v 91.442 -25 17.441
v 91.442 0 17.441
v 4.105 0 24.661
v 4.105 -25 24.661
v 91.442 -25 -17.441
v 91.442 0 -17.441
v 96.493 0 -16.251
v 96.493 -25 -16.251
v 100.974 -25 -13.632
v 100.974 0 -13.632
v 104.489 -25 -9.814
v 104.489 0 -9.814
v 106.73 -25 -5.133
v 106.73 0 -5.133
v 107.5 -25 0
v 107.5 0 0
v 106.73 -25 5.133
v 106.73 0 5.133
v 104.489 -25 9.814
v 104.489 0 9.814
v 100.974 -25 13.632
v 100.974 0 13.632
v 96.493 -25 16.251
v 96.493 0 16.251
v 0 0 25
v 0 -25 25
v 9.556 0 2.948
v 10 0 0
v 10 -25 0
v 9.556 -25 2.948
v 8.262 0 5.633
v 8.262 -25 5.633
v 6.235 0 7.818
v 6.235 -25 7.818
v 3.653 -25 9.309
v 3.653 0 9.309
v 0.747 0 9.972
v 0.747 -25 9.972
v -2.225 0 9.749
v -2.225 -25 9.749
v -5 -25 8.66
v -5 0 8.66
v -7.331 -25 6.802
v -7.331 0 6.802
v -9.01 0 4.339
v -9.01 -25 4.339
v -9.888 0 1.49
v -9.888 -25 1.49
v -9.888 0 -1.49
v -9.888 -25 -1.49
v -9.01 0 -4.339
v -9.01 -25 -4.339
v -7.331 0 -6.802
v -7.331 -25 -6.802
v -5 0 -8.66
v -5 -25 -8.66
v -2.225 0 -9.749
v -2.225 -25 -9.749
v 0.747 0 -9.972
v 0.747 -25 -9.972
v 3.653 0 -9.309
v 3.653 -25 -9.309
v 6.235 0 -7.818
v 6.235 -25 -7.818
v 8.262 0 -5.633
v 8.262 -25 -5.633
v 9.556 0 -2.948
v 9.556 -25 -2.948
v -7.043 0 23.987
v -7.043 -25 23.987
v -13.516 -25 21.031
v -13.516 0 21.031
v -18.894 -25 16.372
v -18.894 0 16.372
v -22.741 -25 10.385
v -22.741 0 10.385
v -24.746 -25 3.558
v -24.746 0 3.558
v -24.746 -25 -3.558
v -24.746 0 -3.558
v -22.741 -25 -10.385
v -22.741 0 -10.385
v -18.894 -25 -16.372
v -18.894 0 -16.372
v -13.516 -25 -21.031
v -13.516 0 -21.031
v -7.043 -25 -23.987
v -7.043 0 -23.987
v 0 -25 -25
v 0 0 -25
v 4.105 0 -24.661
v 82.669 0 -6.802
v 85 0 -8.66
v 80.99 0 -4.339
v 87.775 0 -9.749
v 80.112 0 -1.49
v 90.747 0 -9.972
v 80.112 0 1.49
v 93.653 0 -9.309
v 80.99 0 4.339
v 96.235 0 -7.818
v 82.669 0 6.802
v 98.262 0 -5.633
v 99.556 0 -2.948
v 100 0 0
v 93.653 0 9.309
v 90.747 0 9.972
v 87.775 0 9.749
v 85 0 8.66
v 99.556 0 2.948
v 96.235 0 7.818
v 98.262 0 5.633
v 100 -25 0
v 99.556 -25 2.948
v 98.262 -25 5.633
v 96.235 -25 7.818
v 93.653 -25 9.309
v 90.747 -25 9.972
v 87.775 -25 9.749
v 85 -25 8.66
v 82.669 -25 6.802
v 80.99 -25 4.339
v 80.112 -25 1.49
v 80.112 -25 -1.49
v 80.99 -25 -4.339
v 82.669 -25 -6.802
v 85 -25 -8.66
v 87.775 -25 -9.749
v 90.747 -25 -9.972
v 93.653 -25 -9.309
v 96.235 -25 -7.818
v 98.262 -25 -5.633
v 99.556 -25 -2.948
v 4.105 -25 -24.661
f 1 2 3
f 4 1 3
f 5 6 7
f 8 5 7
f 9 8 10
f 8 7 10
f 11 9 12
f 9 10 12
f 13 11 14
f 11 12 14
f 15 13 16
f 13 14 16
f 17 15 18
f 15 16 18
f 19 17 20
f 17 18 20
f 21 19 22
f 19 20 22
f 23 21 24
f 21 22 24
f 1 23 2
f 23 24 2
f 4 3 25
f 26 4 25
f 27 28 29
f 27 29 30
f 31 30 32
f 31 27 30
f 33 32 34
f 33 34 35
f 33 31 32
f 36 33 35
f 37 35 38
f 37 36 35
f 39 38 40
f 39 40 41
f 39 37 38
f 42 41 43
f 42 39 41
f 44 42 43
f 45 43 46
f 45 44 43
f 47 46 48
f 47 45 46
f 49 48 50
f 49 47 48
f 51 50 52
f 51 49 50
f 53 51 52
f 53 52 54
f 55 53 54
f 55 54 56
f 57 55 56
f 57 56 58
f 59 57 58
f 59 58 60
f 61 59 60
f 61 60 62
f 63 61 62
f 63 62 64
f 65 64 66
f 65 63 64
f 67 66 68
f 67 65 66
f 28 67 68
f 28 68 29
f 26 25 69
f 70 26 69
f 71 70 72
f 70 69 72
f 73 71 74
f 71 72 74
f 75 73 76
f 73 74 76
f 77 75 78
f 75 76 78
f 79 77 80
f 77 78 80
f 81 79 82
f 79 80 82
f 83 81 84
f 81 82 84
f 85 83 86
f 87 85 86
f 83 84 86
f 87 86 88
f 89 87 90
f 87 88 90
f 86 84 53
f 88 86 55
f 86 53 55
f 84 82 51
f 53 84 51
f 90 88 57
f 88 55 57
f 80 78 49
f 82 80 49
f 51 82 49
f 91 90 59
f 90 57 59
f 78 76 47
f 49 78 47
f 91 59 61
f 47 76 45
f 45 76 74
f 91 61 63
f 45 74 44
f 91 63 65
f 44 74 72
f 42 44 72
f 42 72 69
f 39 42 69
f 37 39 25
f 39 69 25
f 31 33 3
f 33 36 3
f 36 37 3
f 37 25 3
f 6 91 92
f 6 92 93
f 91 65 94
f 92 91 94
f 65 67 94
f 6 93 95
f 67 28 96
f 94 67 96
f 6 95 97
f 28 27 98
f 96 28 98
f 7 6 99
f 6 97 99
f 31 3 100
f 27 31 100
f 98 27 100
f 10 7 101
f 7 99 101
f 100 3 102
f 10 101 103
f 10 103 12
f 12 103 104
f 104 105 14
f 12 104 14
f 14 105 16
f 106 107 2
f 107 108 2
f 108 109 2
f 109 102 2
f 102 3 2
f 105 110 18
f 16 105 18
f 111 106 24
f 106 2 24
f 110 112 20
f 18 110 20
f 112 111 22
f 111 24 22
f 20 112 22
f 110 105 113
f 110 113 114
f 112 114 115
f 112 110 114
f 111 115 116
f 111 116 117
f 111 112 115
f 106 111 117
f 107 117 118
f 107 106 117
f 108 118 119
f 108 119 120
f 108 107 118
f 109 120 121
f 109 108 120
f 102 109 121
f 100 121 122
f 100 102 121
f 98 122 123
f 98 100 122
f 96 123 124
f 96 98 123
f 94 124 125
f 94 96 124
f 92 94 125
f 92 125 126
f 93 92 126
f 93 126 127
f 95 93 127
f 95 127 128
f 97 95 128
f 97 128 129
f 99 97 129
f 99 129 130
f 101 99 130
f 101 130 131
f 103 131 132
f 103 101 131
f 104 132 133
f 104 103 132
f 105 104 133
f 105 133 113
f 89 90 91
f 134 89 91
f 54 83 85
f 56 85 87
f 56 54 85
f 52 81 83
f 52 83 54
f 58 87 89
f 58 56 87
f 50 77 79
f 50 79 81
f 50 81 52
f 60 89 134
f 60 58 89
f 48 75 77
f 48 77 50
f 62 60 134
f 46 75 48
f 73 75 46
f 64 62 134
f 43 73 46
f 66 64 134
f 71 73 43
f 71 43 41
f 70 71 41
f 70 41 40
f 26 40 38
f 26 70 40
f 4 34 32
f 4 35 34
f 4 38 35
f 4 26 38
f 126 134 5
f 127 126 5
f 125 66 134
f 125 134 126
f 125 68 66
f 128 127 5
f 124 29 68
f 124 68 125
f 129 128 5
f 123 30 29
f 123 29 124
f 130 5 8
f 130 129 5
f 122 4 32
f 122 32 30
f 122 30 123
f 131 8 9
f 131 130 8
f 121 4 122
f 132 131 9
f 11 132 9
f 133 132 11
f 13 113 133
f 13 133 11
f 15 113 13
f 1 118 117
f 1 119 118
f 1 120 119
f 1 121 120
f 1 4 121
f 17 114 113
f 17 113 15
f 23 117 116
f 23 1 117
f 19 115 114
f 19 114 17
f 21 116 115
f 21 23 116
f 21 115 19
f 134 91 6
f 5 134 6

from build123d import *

# Parameters (mm, degrees)
F0_R     = 10
F1_DEPTH = 25


with BuildPart() as f1:
    # F0 (on Front) → F1 (new body)
    with BuildSketch(Plane.XZ):
        with BuildLine():
            Line((4.1054428346, 24.6606029758), (0, 25))
            ThreePointArc((0, 25), (-25, 0), (0, -25))
            Line((0, -25), (4.1054428346, -24.6606029758))
            ThreePointArc((4.1054428346, -24.6606029758), (19.0740146648, -16.1611251022), (25, 0))
            ThreePointArc((25, 0), (19.0740146648, 16.1611251022), (4.1054428346, 24.6606029758))
        make_face()
        Circle(F0_R, mode=Mode.SUBTRACT)
        with BuildLine():
            Line((91.4418067738, 17.4405043857), (4.1054428346, 24.6606029758))
            ThreePointArc((4.1054428346, 24.6606029758), (19.0740146648, 16.1611251022), (25, 0))
            ThreePointArc((25, 0), (19.0740146648, -16.1611251022), (4.1054428346, -24.6606029758))
            Line((4.1054428346, -24.6606029758), (91.4418067738, -17.4405043857))
            ThreePointArc((91.4418067738, -17.4405043857), (72.5, 0), (91.4418067738, 17.4405043857))
        make_face()
        with BuildLine():
            ThreePointArc((107.5, 0), (102.8740362463, 11.8536572723), (91.4418067738, 17.4405043857))
            ThreePointArc((91.4418067738, 17.4405043857), (72.5, 0), (91.4418067738, -17.4405043857))
            ThreePointArc((91.4418067738, -17.4405043857), (102.8740362463, -11.8536572723), (107.5, 0))
        make_face()
        with Locations((90, 0)):
            Circle(F0_R, mode=Mode.SUBTRACT)
    extrude(amount=F1_DEPTH)


solid = f1.part
